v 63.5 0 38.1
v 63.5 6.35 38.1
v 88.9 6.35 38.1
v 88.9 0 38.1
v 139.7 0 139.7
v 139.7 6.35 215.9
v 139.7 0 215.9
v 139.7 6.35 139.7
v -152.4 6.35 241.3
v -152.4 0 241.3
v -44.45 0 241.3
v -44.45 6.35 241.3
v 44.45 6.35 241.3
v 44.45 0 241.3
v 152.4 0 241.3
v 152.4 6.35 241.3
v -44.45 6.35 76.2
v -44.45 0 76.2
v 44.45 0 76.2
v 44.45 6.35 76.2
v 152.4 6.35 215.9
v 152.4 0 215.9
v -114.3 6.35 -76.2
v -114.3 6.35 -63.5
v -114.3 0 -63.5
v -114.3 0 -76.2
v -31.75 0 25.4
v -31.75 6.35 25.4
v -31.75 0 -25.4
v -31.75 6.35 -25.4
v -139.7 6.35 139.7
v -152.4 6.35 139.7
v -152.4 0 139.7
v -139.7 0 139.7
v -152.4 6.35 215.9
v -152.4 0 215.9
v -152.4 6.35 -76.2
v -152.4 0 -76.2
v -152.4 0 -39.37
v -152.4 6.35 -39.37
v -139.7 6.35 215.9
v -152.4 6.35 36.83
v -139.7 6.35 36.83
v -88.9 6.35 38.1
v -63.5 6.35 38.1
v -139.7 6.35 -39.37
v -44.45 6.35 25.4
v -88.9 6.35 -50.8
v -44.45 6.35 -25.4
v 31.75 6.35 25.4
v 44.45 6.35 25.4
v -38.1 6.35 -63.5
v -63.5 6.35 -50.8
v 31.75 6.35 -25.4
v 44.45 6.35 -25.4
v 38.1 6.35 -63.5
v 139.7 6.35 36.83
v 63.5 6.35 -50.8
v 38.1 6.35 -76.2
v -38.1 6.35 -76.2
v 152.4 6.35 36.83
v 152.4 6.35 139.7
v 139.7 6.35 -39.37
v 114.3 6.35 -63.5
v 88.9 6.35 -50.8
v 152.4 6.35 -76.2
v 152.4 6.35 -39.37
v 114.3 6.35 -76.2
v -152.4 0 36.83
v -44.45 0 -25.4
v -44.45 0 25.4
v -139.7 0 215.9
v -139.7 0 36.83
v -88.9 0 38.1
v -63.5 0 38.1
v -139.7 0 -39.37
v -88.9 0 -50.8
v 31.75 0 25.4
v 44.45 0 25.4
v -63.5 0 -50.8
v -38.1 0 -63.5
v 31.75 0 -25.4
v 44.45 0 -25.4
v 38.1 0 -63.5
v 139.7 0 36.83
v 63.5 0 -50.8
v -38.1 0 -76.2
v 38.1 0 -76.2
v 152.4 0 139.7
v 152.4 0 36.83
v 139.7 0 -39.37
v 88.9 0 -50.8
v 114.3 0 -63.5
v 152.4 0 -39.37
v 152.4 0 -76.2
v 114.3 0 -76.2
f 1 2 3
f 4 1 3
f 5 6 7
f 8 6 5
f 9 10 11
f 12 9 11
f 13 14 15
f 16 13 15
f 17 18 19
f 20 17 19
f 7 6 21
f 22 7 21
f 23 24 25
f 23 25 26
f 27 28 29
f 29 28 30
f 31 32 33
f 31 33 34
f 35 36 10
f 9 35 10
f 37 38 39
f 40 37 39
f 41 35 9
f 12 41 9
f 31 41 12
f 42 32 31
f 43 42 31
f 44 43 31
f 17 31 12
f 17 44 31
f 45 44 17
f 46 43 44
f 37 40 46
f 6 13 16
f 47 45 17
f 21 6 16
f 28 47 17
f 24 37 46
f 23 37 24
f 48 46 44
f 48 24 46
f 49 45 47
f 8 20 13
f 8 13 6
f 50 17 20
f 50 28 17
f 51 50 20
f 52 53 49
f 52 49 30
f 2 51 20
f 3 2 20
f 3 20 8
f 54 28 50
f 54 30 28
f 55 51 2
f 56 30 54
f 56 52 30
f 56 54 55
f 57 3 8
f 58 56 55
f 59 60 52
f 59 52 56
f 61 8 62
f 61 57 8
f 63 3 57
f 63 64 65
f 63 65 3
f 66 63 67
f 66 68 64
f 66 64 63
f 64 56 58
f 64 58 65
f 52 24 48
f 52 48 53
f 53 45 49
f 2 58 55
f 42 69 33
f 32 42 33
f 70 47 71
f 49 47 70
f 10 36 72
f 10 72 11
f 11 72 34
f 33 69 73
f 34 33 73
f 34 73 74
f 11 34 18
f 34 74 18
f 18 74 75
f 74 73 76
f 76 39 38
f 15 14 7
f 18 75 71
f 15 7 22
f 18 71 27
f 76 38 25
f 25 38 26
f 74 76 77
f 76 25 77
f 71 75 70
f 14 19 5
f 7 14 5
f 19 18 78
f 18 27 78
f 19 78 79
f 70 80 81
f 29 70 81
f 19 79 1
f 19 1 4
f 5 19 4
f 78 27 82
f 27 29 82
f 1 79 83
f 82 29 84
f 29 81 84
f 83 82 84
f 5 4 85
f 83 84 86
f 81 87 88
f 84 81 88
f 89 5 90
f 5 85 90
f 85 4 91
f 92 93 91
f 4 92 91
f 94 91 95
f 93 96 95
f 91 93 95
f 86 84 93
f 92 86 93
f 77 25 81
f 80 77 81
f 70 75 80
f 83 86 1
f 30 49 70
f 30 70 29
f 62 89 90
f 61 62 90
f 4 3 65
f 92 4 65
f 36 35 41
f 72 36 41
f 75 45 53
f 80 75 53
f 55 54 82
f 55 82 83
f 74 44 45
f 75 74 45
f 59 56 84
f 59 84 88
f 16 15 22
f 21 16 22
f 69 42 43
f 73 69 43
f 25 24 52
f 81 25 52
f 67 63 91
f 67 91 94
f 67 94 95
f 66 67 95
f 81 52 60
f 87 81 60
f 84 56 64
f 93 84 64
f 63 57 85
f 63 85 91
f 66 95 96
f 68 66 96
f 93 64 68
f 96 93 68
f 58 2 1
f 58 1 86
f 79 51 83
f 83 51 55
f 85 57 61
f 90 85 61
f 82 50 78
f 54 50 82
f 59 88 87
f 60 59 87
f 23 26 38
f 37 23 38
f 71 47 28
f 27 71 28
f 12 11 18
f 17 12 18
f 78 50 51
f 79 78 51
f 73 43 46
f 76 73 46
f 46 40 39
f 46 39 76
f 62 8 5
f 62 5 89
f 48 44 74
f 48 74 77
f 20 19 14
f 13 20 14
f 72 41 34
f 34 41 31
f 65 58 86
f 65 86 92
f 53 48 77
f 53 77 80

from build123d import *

# Parameters (mm, degrees)
BOSS_EXTRUDE1_DEPTH = 6.35
SKETCH2_W           = 12.7
SKETCH2_H           = 76.2
SKETCH2_W_2         = 76.2
SKETCH2_H_2         = 12.7
SKETCH2_W_3         = 25.4
SKETCH2_H_3         = 88.9
CUT_EXTRUDE1_DEPTH  = 286.467638271
SKETCH3_W           = 12.7
SKETCH3_H           = 50.8
CUT_EXTRUDE2_DEPTH  = 286.467638271


with BuildPart() as part:
    # Sketch1 → Boss-Extrude1 (new body)
    with BuildSketch(Plane(origin=(0, 0, 0), x_dir=(1, 0, 0), z_dir=(0, 1, 0))):
        Polygon((-152.4, 76.2), (-152.4, -241.3), (-44.45, -241.3), (-44.45, -76.2), (44.45, -76.2), (44.45, -241.3), (152.4, -241.3), (152.4, 76.2), align=None)
    extrude(amount=BOSS_EXTRUDE1_DEPTH)

    # Sketch2 → Cut-Extrude1 (cut, through all)
    with BuildSketch(Plane(origin=(0, 6.35, 0), x_dir=(1, 0, 0), z_dir=(0, 1, 0))):
        with Locations((146.05, 1.27)):
            Rectangle(SKETCH2_W, SKETCH2_H)
        with Locations((146.05, -177.8)):
            Rectangle(SKETCH2_W, SKETCH2_H)
        with Locations((-146.05, -177.8)):
            Rectangle(SKETCH2_W, SKETCH2_H)
        with Locations((-146.05, 1.27)):
            Rectangle(SKETCH2_W, SKETCH2_H)
        with Locations((-76.2, 69.85)):
            Rectangle(SKETCH2_W_2, SKETCH2_H_2)
        with Locations((76.2, 69.85)):
            Rectangle(SKETCH2_W_2, SKETCH2_H_2)
        with Locations((-76.2, 6.35)):
            Rectangle(SKETCH2_W_3, SKETCH2_H_3)
        with Locations((76.2, 6.35)):
            Rectangle(SKETCH2_W_3, SKETCH2_H_3)
    extrude(amount=-CUT_EXTRUDE1_DEPTH, mode=Mode.SUBTRACT)

    # Sketch3 → Cut-Extrude2 (cut, through all)
    with BuildSketch(Plane(origin=(0, 6.35, 0), x_dir=(1, 0, 0), z_dir=(0, 1, 0))):
        with Locations((-38.1, 0)):
            Rectangle(SKETCH3_W, SKETCH3_H)
        with Locations((38.1, 0)):
            Rectangle(SKETCH3_W, SKETCH3_H)
    extrude(amount=-CUT_EXTRUDE2_DEPTH, mode=Mode.SUBTRACT)


solid = part.part
